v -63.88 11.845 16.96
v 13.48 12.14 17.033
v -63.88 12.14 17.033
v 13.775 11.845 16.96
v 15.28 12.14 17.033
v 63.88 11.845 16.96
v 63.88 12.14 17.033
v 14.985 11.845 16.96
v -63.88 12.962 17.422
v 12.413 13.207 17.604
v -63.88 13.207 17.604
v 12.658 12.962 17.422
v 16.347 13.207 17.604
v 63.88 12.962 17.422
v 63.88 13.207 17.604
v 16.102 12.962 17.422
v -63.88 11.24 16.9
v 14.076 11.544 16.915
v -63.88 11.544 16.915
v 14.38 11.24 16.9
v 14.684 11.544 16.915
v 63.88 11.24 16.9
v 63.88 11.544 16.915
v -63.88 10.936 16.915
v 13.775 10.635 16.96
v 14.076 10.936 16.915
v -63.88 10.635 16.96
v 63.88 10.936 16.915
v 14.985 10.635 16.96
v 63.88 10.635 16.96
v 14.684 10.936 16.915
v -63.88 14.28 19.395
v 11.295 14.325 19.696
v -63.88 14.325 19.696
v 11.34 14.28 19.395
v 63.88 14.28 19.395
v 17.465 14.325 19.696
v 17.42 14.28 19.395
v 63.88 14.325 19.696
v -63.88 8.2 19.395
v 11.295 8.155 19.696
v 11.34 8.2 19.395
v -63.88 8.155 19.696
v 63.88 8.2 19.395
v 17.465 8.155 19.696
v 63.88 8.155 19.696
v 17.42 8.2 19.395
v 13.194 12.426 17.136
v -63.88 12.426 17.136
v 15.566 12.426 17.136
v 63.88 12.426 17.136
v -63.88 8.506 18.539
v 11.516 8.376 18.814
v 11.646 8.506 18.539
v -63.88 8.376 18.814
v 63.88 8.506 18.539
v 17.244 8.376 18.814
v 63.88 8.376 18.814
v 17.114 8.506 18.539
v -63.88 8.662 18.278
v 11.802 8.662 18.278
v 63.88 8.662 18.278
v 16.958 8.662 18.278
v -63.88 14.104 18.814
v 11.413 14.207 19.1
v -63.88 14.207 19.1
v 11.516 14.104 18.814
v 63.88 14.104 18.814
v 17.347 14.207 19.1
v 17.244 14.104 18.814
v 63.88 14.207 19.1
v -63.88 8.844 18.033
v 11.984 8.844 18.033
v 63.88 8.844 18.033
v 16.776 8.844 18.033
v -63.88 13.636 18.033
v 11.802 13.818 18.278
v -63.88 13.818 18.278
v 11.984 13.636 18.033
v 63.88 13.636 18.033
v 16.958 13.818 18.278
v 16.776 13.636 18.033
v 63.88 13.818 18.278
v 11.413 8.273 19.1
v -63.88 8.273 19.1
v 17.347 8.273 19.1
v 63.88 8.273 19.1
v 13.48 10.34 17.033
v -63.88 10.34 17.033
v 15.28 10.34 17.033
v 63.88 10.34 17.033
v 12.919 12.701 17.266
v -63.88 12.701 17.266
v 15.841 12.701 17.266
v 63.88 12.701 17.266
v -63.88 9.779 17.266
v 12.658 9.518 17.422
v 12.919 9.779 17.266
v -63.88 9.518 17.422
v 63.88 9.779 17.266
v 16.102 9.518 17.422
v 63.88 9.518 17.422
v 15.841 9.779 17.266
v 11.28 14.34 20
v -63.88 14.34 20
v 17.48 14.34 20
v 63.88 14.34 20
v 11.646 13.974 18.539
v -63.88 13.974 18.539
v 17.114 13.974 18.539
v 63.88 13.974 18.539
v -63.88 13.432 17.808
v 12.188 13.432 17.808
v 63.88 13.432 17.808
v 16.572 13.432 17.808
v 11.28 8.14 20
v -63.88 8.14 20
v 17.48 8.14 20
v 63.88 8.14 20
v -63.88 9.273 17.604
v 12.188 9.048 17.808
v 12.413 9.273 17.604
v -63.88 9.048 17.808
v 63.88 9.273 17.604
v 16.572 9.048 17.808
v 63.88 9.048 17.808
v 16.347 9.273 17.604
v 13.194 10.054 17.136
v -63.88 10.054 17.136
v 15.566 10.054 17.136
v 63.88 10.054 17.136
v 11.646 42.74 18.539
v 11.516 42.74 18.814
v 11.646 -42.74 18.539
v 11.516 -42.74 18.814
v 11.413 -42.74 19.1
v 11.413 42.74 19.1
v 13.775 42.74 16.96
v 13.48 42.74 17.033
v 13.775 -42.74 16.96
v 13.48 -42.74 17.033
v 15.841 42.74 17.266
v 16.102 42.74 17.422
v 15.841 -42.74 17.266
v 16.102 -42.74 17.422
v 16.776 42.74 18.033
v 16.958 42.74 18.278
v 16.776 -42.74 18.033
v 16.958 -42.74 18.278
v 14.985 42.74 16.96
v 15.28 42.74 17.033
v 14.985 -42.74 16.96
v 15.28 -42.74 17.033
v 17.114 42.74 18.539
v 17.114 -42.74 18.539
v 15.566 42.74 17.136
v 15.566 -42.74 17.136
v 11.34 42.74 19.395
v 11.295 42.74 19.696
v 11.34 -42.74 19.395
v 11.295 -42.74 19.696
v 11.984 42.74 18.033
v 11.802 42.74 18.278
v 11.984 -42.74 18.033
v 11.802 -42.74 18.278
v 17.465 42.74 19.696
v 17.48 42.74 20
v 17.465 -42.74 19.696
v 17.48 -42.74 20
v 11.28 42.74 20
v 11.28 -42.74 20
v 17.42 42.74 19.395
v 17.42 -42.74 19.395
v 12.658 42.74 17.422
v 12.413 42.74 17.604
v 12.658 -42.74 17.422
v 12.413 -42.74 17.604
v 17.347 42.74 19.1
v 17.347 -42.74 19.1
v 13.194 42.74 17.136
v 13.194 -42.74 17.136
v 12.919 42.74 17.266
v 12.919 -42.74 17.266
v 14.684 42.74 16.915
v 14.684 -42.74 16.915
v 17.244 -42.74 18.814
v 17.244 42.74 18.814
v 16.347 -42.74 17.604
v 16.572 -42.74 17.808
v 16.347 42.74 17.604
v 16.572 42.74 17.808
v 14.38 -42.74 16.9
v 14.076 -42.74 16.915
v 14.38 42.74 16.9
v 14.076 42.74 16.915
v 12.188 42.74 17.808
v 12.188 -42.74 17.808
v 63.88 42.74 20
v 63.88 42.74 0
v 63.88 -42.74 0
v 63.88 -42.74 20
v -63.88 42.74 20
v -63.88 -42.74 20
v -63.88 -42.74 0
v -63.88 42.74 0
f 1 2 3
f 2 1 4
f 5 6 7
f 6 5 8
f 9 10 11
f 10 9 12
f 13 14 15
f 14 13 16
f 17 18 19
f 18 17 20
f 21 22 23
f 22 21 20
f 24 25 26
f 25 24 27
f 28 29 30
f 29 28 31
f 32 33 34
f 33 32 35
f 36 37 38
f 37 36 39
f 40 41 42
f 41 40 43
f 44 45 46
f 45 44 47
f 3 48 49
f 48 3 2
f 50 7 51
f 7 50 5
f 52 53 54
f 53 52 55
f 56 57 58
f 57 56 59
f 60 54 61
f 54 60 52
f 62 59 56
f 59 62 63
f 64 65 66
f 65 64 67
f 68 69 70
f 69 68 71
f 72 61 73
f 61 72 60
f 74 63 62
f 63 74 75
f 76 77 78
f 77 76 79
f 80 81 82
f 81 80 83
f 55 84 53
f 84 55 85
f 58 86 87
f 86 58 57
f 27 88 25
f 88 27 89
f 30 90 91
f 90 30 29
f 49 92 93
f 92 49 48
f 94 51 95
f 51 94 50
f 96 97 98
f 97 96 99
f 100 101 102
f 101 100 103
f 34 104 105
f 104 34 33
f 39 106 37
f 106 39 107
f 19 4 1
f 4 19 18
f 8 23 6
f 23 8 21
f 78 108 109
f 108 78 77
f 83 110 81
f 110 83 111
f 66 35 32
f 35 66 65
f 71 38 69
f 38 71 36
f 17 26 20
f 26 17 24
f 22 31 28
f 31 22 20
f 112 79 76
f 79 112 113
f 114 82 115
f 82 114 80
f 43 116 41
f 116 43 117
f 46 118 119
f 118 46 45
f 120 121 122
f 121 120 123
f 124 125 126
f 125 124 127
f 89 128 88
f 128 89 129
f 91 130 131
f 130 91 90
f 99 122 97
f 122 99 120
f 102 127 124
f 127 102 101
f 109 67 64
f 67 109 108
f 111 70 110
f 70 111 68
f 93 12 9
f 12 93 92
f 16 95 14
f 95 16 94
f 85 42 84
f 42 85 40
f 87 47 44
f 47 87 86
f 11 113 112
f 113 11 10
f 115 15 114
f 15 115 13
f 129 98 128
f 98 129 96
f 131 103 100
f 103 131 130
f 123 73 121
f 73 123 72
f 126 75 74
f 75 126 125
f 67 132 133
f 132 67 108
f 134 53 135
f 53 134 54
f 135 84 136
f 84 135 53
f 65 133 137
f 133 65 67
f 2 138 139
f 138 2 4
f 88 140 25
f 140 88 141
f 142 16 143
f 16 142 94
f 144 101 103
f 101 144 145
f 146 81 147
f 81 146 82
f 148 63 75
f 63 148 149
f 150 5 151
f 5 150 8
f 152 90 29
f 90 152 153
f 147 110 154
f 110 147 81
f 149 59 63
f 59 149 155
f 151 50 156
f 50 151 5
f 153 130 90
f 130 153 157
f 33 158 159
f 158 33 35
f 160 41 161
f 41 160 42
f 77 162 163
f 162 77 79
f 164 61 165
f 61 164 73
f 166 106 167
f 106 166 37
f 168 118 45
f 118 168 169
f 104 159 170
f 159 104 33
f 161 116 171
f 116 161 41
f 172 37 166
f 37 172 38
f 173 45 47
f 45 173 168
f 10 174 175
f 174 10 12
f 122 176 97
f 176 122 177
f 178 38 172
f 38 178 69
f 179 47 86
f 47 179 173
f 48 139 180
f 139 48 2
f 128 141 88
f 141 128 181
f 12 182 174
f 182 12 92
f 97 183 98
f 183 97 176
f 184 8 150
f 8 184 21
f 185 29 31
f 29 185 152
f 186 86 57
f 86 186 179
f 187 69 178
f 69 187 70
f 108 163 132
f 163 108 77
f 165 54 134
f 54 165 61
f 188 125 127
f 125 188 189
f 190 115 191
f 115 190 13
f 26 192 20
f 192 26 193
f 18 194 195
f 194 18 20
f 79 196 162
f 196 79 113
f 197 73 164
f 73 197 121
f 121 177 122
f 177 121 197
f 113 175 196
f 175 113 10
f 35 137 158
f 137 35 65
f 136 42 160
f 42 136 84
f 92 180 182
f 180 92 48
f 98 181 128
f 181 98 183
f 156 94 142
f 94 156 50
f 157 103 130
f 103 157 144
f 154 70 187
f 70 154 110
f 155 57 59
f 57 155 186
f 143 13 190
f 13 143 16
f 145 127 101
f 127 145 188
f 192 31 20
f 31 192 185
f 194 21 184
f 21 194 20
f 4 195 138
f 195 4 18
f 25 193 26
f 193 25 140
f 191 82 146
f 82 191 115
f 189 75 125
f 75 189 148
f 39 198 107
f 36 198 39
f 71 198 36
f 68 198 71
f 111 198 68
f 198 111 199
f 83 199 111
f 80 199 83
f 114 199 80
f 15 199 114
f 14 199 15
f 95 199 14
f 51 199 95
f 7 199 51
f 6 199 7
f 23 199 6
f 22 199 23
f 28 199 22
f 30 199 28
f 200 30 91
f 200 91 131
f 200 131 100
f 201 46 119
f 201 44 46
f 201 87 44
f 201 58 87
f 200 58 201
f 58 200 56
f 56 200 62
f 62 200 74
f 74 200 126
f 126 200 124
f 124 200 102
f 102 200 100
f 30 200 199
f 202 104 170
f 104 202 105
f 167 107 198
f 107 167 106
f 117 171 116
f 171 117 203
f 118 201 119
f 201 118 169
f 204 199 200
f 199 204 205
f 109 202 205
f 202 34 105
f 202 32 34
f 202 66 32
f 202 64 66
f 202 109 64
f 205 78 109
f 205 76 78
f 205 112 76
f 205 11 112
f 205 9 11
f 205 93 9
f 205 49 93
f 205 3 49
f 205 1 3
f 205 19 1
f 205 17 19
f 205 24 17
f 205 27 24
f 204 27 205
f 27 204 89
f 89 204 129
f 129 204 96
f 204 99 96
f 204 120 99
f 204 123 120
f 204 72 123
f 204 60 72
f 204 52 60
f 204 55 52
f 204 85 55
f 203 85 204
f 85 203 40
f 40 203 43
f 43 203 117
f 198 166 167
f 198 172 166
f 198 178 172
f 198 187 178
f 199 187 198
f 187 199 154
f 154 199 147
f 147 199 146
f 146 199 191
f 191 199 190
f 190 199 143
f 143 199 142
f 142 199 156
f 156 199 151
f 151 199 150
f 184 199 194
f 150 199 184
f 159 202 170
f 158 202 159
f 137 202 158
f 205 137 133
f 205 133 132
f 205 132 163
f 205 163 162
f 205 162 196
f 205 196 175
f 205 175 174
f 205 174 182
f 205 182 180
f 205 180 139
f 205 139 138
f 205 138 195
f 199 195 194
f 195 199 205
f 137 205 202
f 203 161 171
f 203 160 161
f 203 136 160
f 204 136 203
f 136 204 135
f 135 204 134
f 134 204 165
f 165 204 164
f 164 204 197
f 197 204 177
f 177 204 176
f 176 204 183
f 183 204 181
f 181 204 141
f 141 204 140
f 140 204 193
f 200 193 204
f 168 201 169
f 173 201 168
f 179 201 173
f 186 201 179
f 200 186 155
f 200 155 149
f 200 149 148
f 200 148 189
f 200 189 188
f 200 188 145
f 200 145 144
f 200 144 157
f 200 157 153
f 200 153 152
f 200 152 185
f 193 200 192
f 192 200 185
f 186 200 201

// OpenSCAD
// Built by bench/smallmodels/features/compiler.py from a list of features.
$fn = 64;
difference() {
  union() {
    translate([0, 0, 0]) translate([-63.88, -42.74, 0]) cube([127.76, 85.48, 20]);
  }
  union() {
    translate([14.38, 11.24, 20]) rotate([0, 0, 0]) rotate([0, 90, 0]) cylinder(d = 6.2, h = 1080, center = true);
    translate([14.38, 11.24, 20]) rotate([0, 0, 0]) rotate([90, 0, 0]) cylinder(d = 6.2, h = 1080, center = true);
  }
}
